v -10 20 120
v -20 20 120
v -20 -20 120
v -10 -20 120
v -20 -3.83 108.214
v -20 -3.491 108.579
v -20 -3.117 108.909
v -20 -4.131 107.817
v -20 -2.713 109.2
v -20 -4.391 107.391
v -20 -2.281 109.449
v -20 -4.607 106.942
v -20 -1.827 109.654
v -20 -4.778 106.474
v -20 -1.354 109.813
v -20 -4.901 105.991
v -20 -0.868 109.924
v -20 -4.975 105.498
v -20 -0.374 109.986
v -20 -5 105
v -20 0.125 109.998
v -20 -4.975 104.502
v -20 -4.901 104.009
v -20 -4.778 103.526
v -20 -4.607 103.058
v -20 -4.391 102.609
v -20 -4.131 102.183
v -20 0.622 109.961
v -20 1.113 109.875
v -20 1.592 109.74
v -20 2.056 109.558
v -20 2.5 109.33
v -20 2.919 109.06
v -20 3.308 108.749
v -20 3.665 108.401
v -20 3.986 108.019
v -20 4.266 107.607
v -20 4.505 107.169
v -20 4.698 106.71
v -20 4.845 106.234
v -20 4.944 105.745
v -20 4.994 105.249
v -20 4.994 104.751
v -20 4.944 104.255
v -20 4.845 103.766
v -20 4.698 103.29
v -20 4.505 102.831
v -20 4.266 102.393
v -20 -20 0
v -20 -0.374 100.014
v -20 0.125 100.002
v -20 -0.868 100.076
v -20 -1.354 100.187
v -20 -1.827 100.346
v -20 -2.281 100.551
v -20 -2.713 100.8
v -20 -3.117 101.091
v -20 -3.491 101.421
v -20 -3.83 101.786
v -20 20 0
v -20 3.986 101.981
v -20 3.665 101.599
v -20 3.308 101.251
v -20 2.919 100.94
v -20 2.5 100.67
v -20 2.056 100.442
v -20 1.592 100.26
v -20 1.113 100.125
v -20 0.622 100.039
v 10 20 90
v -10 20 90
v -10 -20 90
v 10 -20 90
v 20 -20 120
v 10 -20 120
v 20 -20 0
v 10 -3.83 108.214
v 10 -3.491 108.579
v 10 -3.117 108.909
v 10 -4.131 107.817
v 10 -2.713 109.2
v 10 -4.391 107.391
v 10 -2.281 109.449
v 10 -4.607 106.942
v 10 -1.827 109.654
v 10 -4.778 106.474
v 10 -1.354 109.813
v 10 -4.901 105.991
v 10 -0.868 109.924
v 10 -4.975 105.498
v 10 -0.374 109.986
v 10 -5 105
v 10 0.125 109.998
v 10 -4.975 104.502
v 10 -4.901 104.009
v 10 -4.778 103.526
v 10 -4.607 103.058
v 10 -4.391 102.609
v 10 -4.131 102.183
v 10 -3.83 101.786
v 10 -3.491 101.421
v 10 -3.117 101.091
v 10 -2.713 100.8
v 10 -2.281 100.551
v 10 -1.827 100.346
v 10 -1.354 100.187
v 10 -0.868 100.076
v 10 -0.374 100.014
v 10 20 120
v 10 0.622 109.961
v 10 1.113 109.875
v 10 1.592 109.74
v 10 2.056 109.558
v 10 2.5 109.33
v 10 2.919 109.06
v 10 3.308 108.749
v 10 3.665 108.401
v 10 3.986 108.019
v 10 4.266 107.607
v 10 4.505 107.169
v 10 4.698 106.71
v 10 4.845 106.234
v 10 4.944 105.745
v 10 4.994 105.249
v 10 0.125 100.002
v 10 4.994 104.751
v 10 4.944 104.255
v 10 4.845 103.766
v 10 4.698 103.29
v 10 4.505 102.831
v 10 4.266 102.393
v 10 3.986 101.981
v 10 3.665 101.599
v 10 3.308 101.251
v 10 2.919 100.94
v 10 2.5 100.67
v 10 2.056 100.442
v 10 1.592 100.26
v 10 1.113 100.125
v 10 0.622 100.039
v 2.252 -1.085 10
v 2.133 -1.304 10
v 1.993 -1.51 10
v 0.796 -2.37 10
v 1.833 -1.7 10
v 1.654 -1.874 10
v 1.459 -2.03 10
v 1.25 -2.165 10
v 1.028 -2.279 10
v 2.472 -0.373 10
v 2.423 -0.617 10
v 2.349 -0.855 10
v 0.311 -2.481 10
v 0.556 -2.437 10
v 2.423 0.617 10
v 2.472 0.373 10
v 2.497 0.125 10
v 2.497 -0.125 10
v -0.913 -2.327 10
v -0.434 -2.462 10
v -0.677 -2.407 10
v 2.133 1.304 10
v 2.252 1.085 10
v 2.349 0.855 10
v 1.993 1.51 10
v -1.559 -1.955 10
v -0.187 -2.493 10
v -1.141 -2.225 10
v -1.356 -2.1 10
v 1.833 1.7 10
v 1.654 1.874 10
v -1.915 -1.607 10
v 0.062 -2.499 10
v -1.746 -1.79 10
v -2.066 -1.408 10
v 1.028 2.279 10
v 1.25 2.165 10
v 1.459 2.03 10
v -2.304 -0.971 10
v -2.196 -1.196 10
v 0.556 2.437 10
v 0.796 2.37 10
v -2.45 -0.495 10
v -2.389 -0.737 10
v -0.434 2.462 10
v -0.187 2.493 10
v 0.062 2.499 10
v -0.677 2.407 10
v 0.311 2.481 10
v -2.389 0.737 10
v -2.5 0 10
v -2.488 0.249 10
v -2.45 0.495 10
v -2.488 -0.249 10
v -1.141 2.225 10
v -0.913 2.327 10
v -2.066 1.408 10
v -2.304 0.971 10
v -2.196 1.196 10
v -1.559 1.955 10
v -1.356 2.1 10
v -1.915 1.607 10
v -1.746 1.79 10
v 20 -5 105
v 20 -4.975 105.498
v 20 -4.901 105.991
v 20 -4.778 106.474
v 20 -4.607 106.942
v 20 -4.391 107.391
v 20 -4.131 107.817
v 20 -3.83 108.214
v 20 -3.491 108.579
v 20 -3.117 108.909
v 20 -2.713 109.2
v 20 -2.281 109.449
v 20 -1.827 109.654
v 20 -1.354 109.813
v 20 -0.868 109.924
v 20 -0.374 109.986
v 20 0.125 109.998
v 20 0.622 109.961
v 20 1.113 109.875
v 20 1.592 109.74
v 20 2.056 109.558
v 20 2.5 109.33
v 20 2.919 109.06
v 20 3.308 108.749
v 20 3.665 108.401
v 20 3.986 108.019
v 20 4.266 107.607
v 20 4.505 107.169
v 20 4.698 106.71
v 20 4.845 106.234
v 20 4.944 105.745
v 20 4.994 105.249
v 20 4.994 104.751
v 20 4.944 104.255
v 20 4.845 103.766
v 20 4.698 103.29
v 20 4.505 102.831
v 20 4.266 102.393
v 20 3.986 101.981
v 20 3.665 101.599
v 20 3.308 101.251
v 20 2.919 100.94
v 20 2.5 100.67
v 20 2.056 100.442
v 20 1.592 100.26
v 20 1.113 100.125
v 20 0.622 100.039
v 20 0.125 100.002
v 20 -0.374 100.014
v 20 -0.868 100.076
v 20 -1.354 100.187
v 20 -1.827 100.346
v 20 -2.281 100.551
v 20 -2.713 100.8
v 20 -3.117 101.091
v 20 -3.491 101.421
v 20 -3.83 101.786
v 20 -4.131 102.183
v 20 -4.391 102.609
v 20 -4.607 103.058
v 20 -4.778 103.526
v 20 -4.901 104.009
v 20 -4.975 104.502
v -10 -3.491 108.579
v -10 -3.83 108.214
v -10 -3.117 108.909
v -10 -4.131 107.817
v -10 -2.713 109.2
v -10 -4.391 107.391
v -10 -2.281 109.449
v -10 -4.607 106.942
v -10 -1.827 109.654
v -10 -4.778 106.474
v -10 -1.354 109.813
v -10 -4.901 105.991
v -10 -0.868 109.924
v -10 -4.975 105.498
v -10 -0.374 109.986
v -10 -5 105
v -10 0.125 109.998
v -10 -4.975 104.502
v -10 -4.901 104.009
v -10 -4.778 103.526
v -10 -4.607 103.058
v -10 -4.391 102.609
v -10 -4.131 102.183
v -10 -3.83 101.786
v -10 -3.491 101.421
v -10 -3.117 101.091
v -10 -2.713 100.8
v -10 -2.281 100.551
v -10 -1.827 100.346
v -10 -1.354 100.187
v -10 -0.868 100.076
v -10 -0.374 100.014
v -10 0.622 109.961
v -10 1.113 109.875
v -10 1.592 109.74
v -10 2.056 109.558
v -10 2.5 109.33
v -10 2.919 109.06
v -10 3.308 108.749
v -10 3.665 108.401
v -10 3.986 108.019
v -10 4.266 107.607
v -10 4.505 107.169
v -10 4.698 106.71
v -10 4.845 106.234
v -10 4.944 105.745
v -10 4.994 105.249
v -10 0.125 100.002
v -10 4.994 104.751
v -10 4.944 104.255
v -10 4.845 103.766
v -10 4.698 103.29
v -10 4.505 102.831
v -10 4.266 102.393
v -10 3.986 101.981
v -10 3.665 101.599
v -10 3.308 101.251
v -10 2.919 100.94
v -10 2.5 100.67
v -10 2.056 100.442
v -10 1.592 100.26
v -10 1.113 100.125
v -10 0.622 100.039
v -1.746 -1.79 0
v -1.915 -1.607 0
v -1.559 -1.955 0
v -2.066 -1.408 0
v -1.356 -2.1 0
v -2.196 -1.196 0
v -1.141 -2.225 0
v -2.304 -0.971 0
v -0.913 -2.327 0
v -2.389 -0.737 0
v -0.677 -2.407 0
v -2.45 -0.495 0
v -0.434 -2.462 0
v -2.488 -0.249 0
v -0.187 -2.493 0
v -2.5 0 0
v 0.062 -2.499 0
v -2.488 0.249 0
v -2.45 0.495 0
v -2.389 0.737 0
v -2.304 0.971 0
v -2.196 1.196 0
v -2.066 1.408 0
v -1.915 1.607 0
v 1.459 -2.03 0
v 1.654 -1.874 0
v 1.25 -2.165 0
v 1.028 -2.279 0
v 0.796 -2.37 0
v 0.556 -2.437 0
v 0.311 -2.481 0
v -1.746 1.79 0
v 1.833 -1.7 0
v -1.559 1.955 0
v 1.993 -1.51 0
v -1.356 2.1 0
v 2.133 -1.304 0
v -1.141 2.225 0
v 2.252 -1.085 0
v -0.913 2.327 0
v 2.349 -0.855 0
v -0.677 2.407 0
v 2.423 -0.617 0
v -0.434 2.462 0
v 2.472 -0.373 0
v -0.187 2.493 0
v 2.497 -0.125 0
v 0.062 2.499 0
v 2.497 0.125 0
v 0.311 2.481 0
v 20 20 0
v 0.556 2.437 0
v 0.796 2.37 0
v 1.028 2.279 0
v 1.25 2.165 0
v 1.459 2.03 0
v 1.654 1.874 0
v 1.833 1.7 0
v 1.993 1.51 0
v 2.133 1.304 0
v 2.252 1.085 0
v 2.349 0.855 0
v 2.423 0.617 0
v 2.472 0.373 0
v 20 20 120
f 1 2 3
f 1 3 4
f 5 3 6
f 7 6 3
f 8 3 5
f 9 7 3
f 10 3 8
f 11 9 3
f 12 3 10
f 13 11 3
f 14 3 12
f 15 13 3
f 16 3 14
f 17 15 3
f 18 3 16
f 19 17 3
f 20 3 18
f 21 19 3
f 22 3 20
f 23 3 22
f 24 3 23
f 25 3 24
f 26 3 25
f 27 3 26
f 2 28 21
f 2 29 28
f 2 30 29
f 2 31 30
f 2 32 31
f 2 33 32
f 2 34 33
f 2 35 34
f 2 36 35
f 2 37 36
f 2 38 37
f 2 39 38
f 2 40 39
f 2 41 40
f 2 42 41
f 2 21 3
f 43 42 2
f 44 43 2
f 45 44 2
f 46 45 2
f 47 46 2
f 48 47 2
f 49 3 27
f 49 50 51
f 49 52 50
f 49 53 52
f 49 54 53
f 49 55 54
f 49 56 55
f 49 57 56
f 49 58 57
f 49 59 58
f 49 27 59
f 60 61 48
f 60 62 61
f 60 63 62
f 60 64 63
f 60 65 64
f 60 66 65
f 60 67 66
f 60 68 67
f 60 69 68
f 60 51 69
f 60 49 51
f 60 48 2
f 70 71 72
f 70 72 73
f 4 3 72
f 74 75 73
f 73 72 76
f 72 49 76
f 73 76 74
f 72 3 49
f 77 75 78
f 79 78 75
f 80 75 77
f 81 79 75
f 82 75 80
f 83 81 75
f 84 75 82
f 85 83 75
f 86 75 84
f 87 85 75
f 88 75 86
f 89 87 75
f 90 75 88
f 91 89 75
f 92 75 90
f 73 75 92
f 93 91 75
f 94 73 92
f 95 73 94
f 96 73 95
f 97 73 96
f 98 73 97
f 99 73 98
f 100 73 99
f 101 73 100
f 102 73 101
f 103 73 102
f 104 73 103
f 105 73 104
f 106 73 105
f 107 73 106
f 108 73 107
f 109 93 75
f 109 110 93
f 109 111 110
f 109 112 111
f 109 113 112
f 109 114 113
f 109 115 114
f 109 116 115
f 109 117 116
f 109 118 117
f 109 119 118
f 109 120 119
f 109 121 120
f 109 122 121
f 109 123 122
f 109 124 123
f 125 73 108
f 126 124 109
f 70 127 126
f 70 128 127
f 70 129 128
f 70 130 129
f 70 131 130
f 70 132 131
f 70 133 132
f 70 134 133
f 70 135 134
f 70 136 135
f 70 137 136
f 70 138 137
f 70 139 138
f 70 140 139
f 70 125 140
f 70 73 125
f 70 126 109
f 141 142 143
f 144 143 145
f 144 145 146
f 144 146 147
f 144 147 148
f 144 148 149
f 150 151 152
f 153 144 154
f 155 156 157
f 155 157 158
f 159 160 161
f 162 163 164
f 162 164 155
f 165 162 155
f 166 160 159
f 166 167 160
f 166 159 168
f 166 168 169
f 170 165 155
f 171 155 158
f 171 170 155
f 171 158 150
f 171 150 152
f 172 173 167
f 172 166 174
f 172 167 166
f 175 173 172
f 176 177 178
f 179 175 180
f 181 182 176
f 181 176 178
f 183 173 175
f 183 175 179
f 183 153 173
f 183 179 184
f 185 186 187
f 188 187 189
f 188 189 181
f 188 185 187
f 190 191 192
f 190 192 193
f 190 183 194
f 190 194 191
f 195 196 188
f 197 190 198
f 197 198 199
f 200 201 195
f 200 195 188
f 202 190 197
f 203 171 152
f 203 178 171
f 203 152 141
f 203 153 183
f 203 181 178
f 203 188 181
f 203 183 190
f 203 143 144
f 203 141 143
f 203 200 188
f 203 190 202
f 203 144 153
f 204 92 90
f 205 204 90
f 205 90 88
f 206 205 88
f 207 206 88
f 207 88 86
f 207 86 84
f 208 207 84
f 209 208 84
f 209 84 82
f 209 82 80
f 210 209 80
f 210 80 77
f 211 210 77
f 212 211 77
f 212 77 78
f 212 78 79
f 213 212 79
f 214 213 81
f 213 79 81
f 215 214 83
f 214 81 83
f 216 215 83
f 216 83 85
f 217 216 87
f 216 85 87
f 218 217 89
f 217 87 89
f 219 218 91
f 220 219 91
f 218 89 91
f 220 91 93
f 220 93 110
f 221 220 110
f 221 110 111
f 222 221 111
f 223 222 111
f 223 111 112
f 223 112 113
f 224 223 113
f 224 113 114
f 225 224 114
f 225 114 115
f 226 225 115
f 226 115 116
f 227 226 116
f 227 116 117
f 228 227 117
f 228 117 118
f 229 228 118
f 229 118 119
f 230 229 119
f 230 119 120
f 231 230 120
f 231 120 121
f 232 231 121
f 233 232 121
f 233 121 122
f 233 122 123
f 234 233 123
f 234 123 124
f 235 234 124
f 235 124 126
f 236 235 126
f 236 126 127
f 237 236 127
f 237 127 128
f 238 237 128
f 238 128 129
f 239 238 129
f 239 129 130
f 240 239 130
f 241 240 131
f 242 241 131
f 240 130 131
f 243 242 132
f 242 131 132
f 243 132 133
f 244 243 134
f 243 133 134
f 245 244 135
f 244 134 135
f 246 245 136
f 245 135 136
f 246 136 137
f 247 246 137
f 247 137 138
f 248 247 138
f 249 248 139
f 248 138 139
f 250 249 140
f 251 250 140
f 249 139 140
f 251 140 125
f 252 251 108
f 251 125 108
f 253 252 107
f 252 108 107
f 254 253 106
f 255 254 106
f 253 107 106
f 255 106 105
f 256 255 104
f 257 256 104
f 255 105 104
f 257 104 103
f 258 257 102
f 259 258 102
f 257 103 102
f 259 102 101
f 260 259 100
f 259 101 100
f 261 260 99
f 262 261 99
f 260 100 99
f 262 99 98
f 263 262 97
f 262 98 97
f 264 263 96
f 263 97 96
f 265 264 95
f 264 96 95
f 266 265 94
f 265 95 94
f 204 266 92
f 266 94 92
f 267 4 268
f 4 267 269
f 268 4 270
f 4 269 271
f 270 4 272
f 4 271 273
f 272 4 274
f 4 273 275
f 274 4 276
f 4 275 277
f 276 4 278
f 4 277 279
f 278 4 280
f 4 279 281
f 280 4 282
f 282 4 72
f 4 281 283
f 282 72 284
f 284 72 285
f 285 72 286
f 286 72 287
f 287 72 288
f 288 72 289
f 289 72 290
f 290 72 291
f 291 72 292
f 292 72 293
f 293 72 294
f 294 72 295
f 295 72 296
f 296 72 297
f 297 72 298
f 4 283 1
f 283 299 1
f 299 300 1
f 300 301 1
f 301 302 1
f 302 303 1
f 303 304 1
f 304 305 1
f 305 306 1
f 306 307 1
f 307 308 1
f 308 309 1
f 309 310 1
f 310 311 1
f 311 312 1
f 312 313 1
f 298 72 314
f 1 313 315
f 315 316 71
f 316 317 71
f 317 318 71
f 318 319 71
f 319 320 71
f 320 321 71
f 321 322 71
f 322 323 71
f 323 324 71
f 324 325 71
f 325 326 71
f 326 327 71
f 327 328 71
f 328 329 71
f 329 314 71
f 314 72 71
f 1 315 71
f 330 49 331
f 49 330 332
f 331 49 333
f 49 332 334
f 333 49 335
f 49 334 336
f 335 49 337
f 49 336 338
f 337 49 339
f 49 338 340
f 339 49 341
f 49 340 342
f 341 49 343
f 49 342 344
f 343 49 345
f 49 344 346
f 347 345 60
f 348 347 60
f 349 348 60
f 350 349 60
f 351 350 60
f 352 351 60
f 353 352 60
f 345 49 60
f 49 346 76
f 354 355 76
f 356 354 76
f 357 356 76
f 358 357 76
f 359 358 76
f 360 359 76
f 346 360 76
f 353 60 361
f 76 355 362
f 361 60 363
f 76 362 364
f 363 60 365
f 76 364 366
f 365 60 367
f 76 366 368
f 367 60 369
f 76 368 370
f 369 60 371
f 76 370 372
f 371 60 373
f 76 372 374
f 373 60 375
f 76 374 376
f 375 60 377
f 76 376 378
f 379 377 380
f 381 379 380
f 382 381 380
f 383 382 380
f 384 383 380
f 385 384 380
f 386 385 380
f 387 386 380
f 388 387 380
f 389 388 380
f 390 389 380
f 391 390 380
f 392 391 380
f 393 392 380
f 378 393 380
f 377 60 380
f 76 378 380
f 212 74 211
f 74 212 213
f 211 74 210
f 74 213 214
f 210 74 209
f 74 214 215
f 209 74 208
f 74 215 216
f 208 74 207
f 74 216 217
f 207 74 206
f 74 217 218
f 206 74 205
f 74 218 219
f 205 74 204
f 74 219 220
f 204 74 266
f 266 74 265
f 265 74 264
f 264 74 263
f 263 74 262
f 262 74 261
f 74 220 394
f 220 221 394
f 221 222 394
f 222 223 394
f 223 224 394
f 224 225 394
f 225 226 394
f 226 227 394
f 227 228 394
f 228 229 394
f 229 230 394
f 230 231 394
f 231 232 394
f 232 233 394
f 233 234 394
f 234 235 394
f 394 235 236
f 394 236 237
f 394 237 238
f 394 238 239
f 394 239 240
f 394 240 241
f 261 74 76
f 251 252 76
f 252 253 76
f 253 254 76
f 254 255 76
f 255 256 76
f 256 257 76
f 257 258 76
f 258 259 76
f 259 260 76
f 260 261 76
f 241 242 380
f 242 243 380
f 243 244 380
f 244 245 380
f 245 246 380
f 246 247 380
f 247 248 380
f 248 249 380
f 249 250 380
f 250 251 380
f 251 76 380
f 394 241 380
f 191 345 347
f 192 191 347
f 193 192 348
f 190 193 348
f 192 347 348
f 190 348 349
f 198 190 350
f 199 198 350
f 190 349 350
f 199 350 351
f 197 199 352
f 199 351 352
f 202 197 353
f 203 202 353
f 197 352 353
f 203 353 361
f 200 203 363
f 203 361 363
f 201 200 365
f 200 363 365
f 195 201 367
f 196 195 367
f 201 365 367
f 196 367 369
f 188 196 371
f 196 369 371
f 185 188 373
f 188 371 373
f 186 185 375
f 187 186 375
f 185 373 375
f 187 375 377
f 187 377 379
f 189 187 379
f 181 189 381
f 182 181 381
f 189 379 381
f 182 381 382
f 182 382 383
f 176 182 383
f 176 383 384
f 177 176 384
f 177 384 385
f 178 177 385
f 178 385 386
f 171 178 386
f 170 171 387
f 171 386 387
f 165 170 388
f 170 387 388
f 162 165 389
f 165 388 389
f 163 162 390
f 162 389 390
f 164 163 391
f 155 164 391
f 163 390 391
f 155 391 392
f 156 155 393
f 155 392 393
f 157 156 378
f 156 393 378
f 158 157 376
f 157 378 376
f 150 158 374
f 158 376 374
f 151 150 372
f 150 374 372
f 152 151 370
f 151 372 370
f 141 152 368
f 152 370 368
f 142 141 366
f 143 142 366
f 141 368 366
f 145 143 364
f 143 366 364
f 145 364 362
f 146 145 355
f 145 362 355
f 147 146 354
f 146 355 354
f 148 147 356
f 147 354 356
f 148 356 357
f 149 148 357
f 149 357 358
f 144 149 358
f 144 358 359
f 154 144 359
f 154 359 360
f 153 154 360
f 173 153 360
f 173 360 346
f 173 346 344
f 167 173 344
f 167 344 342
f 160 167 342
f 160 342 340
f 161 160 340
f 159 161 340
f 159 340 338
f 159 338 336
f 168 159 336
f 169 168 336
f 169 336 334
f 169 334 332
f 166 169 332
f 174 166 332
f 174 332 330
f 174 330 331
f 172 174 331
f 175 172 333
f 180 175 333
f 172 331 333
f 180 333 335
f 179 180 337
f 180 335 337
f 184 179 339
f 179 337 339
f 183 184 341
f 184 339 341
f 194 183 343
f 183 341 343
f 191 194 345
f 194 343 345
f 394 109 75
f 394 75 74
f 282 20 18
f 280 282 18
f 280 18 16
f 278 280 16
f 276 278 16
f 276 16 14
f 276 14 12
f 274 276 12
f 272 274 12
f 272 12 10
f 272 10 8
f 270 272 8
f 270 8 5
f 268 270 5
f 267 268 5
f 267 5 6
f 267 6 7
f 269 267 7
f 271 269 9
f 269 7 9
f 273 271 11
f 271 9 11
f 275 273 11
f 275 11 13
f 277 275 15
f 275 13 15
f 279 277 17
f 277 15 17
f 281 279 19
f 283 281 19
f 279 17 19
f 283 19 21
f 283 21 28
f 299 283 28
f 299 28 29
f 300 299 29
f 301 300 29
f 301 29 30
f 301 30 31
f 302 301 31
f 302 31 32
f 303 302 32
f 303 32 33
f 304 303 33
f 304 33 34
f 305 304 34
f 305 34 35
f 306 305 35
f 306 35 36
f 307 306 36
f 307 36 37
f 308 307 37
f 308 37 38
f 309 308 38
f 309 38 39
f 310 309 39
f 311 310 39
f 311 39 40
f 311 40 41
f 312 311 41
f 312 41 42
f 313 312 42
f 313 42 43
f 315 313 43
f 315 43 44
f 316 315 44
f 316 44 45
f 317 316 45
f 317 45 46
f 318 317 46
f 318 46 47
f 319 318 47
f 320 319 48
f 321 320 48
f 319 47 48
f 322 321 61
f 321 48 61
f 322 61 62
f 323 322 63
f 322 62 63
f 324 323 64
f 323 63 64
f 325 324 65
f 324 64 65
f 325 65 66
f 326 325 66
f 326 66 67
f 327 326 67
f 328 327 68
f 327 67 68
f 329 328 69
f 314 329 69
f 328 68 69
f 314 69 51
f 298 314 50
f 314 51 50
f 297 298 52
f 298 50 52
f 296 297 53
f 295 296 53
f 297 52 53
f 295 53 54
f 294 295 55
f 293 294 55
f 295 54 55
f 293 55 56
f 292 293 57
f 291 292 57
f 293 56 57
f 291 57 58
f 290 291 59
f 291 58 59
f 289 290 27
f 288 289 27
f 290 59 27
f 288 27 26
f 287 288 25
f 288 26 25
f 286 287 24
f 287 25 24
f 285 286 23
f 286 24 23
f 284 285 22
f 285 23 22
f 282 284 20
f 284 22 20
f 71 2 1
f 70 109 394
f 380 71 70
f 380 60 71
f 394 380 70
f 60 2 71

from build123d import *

# Parameters (mm, degrees)
SKICA1_W                 = 40
SKICA1_H                 = 40
P_IDAT_VYSUNUT_M1_DEPTH  = 90
SKICA3_W                 = 10
SKICA3_H                 = 40
P_IDAT_VYSUNUT_M2_DEPTH  = 30
SKICA4_R                 = 5
ODEBRAT_VYSUNUT_M1_DEPTH = 40
SKICA5_R                 = 2.5
ODEBRAT_VYSUNUT_M2_DEPTH = 10


with BuildPart() as part:
    # Skica1 → Přidat vysunutím1 (new body)
    with BuildSketch(Plane.XY):
        Rectangle(SKICA1_W, SKICA1_H)
    extrude(amount=P_IDAT_VYSUNUT_M1_DEPTH)

    # Skica3 → Přidat vysunutím2 (add)
    with BuildSketch(Plane.XY.offset(90)):
        with Locations((15, 0)):
            Rectangle(SKICA3_W, SKICA3_H)
        with Locations((-15, 0)):
            Rectangle(SKICA3_W, SKICA3_H)
    extrude(amount=P_IDAT_VYSUNUT_M2_DEPTH)

    # Skica4 → Odebrat vysunutím1 (cut)
    with BuildSketch(Plane.ZY.offset(20)):
        with Locations(Location((105, 0, 0), (0, 0, 270))):
            Circle(SKICA4_R)
    extrude(amount=-ODEBRAT_VYSUNUT_M1_DEPTH, mode=Mode.SUBTRACT)

    # Skica5 → Odebrat vysunutím2 (cut)
    with BuildSketch(Plane(origin=(0, 0, 0), x_dir=(-1, 0, 0), z_dir=(0, 0, -1))):
        Circle(SKICA5_R)
    extrude(amount=-ODEBRAT_VYSUNUT_M2_DEPTH, mode=Mode.SUBTRACT)


solid = part.part
